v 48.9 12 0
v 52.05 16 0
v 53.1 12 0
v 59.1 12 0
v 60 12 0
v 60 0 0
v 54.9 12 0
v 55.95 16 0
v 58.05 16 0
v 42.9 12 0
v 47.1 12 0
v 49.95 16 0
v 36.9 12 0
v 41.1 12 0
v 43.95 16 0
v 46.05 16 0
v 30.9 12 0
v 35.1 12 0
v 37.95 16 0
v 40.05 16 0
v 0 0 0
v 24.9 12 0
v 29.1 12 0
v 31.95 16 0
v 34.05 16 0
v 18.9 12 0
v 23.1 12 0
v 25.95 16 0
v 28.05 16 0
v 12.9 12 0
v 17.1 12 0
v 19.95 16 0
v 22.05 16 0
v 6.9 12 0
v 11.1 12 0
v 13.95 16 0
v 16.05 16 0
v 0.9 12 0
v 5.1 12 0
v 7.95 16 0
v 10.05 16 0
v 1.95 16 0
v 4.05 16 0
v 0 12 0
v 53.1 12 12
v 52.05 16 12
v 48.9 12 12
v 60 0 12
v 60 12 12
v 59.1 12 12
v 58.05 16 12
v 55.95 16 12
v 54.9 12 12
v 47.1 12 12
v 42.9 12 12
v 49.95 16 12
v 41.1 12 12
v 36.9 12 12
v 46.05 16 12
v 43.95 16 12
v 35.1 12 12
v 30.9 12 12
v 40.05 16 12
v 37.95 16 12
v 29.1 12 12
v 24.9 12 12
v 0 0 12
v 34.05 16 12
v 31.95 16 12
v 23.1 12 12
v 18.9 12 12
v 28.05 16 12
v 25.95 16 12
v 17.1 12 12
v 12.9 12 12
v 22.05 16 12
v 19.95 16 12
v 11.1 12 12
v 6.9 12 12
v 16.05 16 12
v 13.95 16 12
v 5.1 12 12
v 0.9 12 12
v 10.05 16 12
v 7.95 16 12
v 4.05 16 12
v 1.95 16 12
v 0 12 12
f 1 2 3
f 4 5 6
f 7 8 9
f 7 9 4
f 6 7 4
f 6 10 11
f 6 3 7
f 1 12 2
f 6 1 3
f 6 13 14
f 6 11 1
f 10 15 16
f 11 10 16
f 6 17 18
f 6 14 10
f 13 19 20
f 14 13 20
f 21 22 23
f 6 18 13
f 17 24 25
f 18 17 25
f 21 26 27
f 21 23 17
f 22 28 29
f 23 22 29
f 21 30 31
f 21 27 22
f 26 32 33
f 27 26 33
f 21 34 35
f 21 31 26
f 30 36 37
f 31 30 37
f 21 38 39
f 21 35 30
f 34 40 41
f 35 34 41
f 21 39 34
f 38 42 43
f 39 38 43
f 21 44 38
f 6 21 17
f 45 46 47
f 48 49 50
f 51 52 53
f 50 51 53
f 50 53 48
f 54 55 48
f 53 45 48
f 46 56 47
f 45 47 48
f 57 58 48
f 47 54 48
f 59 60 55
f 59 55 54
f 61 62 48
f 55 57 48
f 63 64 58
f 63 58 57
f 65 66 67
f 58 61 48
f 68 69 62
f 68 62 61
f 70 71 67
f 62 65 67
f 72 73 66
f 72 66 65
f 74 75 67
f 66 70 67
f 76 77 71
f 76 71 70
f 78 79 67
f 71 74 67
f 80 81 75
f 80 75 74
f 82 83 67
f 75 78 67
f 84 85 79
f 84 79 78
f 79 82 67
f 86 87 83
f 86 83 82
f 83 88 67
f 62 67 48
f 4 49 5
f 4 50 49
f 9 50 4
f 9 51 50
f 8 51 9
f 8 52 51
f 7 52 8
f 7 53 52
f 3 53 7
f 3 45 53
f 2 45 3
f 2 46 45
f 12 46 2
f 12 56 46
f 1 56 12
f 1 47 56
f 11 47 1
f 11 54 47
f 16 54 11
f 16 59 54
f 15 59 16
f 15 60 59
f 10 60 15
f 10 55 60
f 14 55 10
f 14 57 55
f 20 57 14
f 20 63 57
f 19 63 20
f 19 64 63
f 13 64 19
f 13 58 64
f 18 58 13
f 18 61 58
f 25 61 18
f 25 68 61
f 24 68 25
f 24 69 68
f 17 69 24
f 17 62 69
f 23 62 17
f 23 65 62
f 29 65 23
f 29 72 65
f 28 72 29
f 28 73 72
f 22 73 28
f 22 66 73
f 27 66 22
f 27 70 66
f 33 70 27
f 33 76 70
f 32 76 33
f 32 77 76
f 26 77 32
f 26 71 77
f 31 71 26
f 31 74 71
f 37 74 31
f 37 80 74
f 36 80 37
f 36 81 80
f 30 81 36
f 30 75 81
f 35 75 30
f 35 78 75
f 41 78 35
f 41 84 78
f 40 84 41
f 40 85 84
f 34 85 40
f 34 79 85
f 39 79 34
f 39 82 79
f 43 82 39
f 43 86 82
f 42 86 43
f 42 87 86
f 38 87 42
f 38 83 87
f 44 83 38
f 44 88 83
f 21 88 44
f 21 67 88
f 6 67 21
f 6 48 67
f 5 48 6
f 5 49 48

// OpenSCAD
$fn = 32;

// ----------------------------------------------------------------------
// Gear rack: 10 teeth, pitch 6 mm
// ----------------------------------------------------------------------

// --- parameters (mm) ---
teeth = 10;               // number of teeth
pitch = 6;                // tooth pitch, X
root_w = 4.2;             // tooth width at the root
tip_w = 2.1;              // tooth width at the tip
base_h = 12;              // rack body height, Y
tooth_h = 4;              // tooth height above the body
plate_t = 12;             // rack width, Z (extrusion height)

rack_l = teeth * pitch;  // overall length
total_h = base_h + tooth_h;  // overall height

profile = [[0, 0], [60, 0], [60, 12], [59.1, 12], [58.05, 16], [55.95, 16], [54.9, 12], [53.1, 12], [52.05, 16], [49.95, 16], [48.9, 12], [47.1, 12], [46.05, 16], [43.95, 16], [42.9, 12], [41.1, 12], [40.05, 16], [37.95, 16], [36.9, 12], [35.1, 12], [34.05, 16], [31.95, 16], [30.9, 12], [29.1, 12], [28.05, 16], [25.95, 16], [24.9, 12], [23.1, 12], [22.05, 16], [19.95, 16], [18.9, 12], [17.1, 12], [16.05, 16], [13.95, 16], [12.9, 12], [11.1, 12], [10.05, 16], [7.95, 16], [6.9, 12], [5.1, 12], [4.05, 16], [1.95, 16], [0.9, 12], [0, 12]];  // primary outline, 44 points, counter clockwise

// --- the one profile operation ---
linear_extrude(height = plate_t) polygon(points = profile);
